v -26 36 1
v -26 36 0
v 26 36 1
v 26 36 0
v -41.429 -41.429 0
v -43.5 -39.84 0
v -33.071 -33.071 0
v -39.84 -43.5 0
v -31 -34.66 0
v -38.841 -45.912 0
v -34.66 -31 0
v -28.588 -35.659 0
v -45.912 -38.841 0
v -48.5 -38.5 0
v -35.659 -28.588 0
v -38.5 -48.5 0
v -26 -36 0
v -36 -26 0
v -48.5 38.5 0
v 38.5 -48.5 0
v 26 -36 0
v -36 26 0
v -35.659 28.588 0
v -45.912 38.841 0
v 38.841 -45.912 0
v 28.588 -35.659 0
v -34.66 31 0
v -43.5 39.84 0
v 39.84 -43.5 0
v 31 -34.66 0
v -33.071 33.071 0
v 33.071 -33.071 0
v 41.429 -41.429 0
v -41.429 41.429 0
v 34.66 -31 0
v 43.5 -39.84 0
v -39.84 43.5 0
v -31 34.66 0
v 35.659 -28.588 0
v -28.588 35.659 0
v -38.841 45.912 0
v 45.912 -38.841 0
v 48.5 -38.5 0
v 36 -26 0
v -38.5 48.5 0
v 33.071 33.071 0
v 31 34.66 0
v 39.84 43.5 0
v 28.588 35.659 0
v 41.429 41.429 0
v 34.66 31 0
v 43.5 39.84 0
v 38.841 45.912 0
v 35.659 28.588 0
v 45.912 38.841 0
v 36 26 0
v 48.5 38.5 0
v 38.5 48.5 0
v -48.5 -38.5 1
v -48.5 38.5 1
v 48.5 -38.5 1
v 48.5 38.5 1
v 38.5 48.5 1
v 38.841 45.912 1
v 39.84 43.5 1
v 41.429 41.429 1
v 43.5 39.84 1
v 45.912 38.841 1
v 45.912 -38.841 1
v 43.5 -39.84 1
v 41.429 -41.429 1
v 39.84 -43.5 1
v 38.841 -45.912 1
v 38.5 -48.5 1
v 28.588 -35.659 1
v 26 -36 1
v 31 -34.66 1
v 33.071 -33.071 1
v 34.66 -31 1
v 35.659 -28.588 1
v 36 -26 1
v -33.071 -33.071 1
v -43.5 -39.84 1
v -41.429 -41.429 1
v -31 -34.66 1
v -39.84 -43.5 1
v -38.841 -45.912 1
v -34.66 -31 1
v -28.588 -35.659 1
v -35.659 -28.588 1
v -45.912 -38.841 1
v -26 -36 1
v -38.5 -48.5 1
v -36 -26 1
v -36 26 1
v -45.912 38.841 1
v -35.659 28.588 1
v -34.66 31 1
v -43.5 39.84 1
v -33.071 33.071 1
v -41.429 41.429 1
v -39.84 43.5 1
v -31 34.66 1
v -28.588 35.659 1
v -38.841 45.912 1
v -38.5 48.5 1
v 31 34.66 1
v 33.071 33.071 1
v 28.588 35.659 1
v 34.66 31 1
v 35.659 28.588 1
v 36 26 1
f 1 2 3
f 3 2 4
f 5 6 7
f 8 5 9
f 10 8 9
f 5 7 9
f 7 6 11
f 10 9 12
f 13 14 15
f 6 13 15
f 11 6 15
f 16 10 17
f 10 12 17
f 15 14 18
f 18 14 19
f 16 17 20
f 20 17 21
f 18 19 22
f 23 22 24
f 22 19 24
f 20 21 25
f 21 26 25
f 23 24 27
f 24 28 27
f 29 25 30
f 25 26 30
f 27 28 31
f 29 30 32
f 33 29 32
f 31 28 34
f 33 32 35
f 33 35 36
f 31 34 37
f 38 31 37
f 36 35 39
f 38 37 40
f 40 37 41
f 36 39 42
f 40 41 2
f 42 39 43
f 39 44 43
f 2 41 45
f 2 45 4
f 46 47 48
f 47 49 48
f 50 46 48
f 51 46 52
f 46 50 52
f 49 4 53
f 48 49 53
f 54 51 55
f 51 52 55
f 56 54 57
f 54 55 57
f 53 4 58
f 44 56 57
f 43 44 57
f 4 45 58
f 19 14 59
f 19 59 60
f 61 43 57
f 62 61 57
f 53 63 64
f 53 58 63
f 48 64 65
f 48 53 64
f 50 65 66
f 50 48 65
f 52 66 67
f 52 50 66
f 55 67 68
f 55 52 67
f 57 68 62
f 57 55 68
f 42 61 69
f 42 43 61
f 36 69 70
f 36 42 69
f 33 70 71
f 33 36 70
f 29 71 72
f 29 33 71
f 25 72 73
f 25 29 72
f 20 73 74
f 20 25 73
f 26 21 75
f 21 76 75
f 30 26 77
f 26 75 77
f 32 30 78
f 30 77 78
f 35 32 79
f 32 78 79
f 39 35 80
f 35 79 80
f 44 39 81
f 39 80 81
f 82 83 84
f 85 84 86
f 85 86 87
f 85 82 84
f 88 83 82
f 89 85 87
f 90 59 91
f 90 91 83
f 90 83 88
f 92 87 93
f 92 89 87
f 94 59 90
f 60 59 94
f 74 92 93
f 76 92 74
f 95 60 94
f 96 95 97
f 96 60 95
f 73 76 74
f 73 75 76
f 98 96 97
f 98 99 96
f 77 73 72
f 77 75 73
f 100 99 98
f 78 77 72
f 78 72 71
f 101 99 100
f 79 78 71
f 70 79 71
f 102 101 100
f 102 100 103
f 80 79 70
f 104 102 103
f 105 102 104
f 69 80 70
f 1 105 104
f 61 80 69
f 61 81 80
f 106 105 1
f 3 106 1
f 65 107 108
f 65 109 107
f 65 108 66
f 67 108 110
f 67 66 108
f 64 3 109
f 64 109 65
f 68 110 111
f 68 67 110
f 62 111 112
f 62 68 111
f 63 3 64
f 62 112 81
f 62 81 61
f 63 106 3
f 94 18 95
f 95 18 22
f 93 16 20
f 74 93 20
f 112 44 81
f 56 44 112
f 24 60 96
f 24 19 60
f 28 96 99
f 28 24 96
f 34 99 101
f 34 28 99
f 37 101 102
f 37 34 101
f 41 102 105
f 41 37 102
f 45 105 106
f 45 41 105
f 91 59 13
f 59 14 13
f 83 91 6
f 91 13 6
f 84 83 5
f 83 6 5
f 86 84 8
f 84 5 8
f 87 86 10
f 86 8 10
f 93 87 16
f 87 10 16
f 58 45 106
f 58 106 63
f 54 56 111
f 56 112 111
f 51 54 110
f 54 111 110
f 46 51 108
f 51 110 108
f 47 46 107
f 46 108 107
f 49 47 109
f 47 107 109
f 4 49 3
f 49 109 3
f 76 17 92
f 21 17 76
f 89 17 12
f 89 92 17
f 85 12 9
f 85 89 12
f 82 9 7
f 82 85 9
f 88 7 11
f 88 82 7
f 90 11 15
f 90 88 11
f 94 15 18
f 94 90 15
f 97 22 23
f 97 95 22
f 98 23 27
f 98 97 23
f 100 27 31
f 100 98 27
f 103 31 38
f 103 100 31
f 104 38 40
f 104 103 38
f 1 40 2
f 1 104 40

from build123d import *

# Parameters (mm, degrees)
SKETCH1_W           = 97
SKETCH1_H           = 97
SKETCH1_W_2         = 72
SKETCH1_H_2         = 72
BOSS_EXTRUDE1_DEPTH = 1
SKETCH2_W           = 10
SKETCH2_H           = 10
CUT_EXTRUDE1_DEPTH  = 69.596647148
FILLET1_R           = 10


with BuildPart() as part:
    # Sketch1 → Boss-Extrude1 (new body)
    with BuildSketch(Plane.XY):
        Rectangle(SKETCH1_W, SKETCH1_H)
        Rectangle(SKETCH1_W_2, SKETCH1_H_2, mode=Mode.SUBTRACT)
    extrude(amount=BOSS_EXTRUDE1_DEPTH)

    # Sketch2 → Cut-Extrude1 (cut, through all)
    with BuildSketch(Plane.XY.offset(1)):
        with Locations((-43.5, 43.5)):
            Rectangle(SKETCH2_W, SKETCH2_H)
        with Locations((43.5, 43.5)):
            Rectangle(SKETCH2_W, SKETCH2_H)
        with Locations((43.5, -43.5)):
            Rectangle(SKETCH2_W, SKETCH2_H)
        with Locations((-43.5, -43.5)):
            Rectangle(SKETCH2_W, SKETCH2_H)
    extrude(amount=-CUT_EXTRUDE1_DEPTH, mode=Mode.SUBTRACT)

    # Fillet1
    fillet1_edges = [part.edges().sort_by_distance(p)[0] for p in [
        (-36, -36, 0.5),
        (-38.5, -38.5, 0.5),
        (38.5, -38.5, 0.5),
        (36, -36, 0.5),
        (38.5, 38.5, 0.5),
        (36, 36, 0.5),
        (-38.5, 38.5, 0.5),
        (-36, 36, 0.5),
    ]]
    fillet(fillet1_edges, radius=FILLET1_R - 0.0001)  # a hair under: the kernel refuses the full size


solid = part.part
